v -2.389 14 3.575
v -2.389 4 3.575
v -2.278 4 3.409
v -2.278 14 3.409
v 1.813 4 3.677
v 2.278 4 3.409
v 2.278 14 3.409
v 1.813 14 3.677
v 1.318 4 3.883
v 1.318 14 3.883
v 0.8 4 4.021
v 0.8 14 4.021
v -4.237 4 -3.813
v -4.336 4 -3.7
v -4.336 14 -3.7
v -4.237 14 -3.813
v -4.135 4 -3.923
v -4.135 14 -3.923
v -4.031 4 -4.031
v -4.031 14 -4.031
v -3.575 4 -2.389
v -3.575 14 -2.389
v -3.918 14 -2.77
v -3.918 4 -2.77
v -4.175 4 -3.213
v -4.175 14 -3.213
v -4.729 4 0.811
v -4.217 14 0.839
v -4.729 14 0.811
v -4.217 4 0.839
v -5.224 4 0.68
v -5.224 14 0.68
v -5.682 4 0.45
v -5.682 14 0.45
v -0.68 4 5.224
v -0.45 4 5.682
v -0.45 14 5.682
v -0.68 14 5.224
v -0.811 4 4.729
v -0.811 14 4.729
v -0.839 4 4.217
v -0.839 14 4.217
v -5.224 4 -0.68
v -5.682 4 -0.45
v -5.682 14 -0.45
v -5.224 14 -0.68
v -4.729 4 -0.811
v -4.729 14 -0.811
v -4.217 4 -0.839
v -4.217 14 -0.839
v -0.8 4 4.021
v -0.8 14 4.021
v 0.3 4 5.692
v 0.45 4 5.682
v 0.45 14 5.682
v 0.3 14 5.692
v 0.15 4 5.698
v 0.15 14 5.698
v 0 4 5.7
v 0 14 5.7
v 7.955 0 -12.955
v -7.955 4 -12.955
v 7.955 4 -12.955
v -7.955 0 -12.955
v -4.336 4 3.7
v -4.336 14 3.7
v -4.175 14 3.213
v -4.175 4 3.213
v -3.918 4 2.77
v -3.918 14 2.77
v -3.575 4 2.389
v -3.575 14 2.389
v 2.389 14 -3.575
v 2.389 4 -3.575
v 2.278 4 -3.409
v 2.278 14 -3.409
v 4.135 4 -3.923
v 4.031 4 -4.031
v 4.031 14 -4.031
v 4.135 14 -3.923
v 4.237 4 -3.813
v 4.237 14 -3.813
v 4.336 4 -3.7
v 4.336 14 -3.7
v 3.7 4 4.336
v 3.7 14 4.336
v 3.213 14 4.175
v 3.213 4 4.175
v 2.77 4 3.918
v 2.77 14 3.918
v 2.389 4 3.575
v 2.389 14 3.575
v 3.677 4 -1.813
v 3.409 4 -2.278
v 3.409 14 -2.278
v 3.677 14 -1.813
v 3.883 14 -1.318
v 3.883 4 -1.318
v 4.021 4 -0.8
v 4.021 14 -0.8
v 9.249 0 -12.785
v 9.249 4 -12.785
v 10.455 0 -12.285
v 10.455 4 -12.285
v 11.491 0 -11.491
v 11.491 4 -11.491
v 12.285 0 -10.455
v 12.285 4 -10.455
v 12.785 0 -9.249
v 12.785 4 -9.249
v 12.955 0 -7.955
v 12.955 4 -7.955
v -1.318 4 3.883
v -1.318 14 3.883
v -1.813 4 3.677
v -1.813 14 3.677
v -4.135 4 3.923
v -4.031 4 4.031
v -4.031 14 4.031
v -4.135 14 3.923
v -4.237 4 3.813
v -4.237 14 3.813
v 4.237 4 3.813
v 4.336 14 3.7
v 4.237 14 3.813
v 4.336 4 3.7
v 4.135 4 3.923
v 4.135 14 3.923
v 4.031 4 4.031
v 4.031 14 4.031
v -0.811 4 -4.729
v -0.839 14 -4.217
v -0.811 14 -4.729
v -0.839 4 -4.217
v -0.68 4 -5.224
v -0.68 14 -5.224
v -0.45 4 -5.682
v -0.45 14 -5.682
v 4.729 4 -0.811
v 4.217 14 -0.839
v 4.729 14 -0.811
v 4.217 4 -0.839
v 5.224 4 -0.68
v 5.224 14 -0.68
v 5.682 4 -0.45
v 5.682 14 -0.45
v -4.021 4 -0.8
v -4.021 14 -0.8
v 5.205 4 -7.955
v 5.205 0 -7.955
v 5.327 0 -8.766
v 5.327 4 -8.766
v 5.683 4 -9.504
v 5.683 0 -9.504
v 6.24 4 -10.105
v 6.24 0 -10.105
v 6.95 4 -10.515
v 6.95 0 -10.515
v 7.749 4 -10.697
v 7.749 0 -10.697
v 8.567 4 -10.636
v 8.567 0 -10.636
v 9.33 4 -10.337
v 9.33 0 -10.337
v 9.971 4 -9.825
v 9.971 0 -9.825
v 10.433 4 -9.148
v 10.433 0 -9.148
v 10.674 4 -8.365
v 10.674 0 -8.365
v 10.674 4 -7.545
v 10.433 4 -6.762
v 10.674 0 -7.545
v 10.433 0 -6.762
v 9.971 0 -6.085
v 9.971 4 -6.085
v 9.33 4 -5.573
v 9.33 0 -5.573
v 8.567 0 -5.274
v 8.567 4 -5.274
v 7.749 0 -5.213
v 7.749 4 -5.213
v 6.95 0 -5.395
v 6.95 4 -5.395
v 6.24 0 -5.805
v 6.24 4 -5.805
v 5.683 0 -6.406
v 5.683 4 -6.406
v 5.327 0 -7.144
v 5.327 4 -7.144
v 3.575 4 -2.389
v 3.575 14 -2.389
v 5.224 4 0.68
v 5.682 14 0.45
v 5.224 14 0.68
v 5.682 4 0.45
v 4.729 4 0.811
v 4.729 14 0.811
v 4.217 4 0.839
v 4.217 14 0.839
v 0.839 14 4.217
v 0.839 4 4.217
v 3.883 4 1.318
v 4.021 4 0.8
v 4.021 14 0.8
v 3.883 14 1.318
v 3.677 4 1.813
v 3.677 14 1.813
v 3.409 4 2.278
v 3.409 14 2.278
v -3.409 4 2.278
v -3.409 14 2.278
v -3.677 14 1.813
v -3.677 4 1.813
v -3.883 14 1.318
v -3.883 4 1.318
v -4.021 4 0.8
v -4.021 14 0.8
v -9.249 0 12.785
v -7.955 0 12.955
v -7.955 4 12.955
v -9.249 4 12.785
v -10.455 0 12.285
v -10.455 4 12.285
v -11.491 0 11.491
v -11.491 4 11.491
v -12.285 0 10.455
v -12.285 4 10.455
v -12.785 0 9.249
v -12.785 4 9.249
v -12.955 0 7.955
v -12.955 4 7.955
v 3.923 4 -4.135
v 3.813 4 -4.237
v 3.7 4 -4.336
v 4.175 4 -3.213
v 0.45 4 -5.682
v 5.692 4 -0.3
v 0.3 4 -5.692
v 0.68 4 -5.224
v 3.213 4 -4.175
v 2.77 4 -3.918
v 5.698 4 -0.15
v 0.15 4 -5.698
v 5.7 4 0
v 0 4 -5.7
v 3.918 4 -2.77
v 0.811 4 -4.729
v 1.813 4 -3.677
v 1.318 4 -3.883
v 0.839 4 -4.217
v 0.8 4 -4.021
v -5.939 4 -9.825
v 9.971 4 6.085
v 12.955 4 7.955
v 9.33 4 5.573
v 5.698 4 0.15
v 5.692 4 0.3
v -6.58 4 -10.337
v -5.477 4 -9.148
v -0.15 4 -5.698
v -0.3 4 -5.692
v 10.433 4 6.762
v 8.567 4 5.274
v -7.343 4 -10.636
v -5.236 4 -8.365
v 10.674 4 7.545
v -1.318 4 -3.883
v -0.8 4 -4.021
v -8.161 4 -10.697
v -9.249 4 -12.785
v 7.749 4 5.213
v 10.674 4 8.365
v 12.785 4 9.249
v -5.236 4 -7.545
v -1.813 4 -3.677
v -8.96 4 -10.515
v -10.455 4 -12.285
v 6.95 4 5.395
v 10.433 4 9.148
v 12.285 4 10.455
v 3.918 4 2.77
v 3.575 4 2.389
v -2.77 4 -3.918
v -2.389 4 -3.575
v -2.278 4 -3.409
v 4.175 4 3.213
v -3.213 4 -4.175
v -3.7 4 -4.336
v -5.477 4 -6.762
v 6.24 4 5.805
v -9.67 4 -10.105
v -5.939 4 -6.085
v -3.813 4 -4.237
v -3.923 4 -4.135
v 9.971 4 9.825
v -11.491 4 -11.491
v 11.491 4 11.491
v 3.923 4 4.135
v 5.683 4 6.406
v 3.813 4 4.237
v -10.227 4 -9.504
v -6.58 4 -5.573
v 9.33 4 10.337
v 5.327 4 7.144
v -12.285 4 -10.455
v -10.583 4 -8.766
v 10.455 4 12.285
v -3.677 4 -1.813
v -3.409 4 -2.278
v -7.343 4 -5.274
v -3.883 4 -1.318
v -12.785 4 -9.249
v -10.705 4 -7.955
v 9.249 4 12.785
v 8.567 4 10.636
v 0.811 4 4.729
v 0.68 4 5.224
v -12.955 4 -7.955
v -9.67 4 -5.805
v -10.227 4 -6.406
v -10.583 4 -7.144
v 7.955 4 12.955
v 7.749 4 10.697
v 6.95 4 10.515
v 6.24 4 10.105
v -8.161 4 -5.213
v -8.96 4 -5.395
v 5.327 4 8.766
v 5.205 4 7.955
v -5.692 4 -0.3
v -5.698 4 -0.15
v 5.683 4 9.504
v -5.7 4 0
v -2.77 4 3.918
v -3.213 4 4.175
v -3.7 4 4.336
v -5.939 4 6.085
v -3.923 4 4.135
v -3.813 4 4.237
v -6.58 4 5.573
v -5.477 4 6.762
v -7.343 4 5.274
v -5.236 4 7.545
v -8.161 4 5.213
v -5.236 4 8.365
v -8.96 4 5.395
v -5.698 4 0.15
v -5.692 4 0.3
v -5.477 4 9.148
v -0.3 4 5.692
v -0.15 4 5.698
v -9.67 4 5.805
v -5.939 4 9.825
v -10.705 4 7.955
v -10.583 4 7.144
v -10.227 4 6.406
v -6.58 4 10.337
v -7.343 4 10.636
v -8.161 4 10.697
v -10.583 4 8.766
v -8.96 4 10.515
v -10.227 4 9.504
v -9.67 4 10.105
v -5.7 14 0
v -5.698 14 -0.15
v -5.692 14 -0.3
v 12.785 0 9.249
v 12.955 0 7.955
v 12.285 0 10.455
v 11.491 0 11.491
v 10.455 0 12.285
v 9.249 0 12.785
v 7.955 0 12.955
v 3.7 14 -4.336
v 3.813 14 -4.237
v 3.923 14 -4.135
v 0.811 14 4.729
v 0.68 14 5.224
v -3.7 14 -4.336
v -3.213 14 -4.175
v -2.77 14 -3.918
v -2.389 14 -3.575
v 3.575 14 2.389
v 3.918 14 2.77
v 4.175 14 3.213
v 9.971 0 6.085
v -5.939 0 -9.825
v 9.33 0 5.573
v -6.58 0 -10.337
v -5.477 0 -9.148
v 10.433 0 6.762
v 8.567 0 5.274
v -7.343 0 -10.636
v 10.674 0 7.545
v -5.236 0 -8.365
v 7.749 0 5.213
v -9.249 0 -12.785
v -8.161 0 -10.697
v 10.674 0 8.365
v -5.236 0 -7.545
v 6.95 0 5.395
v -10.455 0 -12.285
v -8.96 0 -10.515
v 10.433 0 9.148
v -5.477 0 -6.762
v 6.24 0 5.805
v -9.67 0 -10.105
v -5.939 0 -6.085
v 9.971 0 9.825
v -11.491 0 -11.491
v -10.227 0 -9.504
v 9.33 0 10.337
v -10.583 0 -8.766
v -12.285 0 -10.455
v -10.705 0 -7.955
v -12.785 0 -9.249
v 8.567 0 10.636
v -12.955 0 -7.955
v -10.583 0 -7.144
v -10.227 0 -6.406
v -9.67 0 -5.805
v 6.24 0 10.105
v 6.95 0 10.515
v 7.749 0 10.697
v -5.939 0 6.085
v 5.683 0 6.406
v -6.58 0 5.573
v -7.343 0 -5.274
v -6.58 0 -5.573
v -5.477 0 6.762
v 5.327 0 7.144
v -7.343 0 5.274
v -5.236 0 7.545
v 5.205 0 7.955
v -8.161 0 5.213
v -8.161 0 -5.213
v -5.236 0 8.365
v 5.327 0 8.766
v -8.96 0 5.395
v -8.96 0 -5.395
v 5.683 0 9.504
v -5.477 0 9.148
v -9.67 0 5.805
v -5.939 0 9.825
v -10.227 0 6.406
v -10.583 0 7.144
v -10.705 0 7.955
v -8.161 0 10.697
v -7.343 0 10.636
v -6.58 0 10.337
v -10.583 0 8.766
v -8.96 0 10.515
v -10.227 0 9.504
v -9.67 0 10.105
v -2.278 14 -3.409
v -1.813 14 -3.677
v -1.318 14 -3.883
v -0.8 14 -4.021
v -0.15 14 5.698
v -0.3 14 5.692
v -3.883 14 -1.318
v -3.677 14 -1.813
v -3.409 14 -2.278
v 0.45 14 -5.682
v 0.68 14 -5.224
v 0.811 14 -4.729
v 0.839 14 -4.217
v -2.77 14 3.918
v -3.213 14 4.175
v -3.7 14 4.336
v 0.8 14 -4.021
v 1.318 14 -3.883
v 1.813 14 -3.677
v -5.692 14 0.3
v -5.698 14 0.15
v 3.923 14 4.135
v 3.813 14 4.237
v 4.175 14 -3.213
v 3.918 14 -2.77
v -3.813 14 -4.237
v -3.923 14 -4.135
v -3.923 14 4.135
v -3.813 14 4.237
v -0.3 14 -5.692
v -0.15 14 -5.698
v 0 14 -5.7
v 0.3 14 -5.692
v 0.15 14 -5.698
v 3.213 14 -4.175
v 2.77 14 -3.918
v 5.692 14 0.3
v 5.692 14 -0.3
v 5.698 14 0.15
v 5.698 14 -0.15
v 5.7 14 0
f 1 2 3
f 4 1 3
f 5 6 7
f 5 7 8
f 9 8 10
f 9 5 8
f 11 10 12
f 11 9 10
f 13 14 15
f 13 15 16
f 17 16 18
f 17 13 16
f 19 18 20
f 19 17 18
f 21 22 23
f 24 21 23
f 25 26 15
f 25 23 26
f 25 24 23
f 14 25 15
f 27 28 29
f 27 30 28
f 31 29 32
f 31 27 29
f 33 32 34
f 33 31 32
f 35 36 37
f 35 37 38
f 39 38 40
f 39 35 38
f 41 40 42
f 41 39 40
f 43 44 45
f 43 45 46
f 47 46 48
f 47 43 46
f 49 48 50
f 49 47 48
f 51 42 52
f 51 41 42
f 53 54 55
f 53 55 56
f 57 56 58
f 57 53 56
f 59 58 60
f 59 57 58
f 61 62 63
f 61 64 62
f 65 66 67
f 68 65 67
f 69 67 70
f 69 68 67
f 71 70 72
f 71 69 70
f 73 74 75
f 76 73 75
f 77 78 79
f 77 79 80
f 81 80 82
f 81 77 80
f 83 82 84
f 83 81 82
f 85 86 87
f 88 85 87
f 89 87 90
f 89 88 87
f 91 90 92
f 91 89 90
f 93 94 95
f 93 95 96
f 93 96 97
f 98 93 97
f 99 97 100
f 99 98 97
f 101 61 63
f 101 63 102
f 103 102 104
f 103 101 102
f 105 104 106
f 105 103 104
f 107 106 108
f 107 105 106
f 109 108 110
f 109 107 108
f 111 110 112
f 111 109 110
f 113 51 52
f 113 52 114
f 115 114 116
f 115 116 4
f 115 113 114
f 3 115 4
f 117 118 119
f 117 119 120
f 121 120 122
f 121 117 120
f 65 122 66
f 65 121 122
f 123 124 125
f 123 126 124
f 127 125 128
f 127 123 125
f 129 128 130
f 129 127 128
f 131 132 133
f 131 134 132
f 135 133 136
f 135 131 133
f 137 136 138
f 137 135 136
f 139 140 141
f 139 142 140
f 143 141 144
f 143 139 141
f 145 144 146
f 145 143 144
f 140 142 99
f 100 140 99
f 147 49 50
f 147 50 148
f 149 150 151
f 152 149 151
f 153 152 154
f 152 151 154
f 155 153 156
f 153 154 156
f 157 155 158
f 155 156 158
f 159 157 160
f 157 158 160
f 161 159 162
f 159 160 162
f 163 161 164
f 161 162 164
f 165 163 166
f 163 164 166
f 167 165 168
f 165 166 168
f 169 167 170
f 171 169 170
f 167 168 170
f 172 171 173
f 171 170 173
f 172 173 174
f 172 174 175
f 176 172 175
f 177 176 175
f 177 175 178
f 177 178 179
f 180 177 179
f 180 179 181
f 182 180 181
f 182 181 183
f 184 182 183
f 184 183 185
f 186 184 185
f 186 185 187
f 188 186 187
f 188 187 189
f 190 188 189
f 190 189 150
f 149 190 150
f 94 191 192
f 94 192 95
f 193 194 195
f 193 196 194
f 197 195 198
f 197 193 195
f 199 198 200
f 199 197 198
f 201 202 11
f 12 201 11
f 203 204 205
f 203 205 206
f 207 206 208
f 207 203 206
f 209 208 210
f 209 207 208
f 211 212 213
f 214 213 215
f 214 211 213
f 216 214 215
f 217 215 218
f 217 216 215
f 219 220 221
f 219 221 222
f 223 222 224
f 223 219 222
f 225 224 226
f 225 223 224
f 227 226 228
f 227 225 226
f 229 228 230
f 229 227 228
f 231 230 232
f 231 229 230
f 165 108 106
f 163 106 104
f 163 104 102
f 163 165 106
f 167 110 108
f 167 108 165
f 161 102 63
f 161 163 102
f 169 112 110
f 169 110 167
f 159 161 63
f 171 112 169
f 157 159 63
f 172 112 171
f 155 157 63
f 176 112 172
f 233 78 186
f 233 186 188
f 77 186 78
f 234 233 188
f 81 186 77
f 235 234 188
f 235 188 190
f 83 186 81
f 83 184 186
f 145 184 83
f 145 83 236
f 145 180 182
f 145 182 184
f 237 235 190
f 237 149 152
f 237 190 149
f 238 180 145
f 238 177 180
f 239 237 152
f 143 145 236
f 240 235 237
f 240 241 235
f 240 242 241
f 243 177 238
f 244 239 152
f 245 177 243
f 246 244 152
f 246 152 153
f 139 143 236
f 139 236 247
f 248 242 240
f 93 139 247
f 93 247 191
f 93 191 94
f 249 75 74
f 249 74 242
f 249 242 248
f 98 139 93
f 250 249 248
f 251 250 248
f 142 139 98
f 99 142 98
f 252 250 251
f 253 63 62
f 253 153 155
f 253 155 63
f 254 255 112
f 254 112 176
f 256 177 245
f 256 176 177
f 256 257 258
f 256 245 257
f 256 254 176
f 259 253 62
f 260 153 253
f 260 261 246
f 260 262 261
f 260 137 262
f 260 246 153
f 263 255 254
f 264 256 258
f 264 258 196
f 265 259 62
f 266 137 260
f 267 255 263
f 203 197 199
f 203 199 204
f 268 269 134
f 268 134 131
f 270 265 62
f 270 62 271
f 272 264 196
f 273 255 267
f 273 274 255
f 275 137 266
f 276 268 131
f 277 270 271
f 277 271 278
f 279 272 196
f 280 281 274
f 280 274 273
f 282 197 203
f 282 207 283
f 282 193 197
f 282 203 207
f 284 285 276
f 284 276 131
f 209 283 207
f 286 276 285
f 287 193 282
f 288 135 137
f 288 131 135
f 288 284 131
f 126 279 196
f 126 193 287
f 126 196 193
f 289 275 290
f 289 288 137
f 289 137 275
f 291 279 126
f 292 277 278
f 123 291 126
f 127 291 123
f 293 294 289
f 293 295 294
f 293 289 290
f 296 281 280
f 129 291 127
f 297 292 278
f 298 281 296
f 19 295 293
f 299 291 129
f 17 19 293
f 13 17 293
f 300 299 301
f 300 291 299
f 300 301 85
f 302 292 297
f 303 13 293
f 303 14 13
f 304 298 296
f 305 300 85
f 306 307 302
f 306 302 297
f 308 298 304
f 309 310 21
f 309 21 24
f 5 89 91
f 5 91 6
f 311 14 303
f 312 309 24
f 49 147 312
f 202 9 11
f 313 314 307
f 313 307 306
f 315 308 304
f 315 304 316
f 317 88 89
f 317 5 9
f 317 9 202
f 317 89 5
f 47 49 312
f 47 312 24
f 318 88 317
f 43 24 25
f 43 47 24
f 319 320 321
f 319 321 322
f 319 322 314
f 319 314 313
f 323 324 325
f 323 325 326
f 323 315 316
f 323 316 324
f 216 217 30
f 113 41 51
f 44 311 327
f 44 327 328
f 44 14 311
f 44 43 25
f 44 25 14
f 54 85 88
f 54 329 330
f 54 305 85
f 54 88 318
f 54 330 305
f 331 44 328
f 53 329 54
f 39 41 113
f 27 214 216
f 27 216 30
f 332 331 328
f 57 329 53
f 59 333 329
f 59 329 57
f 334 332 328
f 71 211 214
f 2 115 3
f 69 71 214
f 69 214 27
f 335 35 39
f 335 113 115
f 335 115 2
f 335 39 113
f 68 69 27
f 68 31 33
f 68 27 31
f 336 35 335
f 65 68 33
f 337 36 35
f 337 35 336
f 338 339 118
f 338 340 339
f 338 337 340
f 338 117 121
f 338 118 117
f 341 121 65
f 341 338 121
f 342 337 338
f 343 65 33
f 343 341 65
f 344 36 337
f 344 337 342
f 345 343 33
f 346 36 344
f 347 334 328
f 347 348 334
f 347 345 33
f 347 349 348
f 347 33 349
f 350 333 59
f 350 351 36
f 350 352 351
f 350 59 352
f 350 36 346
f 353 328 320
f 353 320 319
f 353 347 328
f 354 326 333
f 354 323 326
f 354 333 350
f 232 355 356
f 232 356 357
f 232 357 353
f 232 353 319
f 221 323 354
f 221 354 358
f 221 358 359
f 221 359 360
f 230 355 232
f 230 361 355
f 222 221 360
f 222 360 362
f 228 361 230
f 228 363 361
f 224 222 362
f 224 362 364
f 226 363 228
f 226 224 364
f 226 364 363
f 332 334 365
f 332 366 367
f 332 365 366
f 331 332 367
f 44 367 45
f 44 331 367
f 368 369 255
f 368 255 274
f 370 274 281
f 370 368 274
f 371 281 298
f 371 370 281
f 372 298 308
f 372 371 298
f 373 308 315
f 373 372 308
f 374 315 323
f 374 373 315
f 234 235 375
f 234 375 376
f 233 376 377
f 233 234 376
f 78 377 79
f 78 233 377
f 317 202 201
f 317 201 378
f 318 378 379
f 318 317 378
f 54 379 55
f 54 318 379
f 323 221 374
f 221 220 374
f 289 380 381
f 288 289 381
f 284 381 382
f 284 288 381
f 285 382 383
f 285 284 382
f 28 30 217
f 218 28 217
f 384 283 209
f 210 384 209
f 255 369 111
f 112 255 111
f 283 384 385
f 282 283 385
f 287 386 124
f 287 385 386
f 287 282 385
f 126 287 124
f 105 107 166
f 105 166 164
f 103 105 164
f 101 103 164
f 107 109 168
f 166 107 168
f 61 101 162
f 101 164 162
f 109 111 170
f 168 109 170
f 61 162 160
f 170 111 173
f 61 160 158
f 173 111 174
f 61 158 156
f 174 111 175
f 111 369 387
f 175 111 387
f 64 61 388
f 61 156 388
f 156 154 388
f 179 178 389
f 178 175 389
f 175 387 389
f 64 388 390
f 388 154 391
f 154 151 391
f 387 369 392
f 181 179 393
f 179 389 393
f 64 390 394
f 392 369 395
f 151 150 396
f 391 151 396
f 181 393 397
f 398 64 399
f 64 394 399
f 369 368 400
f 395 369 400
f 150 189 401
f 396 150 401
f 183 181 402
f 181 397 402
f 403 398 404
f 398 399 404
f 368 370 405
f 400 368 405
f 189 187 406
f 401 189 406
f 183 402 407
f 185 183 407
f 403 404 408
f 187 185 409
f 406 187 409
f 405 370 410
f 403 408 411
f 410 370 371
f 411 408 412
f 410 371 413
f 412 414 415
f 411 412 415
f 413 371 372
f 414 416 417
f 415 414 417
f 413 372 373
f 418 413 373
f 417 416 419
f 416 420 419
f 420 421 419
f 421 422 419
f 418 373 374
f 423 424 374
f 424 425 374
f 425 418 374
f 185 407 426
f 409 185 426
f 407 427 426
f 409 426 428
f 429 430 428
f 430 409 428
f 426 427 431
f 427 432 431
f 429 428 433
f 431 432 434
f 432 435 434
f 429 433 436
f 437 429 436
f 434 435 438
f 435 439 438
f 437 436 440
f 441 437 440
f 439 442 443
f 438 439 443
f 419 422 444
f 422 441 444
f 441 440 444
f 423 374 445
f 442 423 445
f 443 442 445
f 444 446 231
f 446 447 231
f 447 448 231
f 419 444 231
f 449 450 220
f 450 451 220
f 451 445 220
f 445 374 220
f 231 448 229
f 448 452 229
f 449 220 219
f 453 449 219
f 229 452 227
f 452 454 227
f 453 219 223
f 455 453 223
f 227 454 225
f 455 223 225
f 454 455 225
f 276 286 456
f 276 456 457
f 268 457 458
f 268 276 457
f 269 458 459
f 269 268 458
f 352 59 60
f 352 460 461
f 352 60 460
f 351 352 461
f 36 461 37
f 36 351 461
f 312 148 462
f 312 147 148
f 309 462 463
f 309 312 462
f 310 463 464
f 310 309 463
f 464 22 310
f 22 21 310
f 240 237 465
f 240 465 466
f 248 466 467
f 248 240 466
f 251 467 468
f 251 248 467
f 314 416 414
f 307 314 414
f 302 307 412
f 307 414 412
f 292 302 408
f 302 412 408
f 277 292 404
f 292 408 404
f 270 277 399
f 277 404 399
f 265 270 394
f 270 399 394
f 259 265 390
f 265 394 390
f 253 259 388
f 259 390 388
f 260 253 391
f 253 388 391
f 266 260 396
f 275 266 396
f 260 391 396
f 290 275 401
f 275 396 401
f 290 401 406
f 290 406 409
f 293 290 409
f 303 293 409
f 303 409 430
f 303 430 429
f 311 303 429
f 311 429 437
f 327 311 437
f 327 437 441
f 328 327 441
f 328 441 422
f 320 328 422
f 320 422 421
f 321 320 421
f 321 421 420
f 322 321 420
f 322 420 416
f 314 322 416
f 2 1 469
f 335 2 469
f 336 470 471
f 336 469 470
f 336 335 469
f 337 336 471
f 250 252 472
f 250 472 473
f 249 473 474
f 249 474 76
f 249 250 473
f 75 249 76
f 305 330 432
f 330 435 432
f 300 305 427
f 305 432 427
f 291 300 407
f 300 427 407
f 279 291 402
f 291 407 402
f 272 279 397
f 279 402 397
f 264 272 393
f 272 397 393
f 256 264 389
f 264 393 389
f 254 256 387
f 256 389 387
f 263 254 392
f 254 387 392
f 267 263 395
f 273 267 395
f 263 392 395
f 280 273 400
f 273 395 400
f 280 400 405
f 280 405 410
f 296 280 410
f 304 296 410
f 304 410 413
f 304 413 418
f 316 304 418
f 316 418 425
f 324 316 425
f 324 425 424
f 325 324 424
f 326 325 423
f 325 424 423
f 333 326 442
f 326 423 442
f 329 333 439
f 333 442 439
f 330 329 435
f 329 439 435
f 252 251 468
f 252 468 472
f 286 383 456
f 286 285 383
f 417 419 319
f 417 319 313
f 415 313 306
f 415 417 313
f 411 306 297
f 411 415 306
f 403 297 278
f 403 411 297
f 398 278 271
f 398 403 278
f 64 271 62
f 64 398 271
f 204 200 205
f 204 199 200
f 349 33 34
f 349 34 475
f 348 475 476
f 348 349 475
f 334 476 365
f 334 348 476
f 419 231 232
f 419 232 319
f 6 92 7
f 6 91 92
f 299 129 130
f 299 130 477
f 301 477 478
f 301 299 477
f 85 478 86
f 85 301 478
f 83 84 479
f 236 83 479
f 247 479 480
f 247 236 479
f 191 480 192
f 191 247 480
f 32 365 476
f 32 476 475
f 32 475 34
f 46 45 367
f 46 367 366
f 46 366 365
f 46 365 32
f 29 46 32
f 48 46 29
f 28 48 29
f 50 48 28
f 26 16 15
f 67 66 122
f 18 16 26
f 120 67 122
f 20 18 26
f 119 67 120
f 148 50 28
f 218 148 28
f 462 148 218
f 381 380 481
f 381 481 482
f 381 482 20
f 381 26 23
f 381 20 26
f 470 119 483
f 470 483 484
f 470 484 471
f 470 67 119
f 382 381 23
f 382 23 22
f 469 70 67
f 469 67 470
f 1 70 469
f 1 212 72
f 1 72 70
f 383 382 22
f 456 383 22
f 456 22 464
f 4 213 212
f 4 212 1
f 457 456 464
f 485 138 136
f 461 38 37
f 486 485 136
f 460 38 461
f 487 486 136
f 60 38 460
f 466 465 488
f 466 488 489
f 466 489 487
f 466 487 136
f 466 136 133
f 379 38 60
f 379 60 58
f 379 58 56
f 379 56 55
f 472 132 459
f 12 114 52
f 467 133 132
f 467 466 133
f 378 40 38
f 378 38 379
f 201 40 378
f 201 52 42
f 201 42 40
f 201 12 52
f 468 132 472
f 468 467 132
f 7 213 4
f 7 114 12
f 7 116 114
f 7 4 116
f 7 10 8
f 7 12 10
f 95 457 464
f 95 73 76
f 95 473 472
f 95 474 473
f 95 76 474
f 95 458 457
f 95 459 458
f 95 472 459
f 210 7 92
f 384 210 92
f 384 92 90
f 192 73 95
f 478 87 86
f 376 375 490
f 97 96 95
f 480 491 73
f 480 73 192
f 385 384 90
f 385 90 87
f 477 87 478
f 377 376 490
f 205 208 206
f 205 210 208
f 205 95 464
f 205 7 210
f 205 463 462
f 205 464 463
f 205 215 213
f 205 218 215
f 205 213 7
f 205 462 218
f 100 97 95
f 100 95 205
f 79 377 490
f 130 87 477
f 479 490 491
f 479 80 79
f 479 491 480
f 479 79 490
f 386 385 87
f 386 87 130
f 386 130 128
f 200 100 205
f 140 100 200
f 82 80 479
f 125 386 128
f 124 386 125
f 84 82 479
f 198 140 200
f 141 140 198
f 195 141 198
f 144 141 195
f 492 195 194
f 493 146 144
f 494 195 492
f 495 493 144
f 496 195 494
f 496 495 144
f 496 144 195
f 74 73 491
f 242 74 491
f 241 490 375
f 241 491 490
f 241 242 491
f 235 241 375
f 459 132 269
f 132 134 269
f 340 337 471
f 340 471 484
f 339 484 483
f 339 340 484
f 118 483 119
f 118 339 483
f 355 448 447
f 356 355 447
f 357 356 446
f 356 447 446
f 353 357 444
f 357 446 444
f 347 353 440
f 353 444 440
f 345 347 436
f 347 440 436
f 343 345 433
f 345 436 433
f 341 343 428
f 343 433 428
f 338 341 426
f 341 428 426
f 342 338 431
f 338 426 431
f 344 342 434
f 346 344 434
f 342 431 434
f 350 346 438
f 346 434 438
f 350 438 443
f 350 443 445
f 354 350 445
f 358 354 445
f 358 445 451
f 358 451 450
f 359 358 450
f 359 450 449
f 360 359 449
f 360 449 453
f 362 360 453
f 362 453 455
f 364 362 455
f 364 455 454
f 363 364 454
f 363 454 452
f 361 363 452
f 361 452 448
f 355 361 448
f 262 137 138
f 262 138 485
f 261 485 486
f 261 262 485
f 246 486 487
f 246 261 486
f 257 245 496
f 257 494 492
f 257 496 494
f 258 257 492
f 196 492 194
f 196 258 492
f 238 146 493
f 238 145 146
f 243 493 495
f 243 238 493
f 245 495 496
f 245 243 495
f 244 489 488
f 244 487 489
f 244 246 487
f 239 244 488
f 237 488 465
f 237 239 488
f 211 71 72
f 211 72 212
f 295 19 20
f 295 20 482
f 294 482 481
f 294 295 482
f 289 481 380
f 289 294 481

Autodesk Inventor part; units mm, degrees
ref_plane "YZ Plane" through (0, 0, 0) normal (1, 0, 0) x (0, 1, 0)
ref_plane "XZ Plane" through (0, 0, 0) normal (0, 1, 0) x (-1, 0, 0)
ref_plane "XY Plane" through (0, 0, 0) normal (0, 0, 1) x (1, 0, 0)
sketch "Sketch1" plane through (0, 0, 0) normal (0, 1, 0) x (-1, 0, 0)
  line L0 (7.955, -7.955) -> (-7.955, -7.955)
  line L1 (-7.955, -7.955) -> (-7.955, 7.955)
  line L2 (-7.955, 7.955) -> (7.955, 7.955)
  line L3 (7.955, 7.955) -> (7.955, -7.955)
  circle A0 centre (7.955, -7.955) radius 5
  circle A1 centre (7.955, -7.955) radius 2.75
  line L4 (0, 0) -> (4.4409, 0)
  line L5 (0, 0) -> (0, 4.5835)
  circle A2 centre (7.955, 7.955) radius 5
  circle A3 centre (7.955, 7.955) radius 2.75
  circle A4 centre (-7.955, -7.955) radius 5
  circle A5 centre (-7.955, -7.955) radius 2.75
  circle A6 centre (-7.955, 7.955) radius 2.75
  circle A7 centre (-7.955, 7.955) radius 5
  line L6 (12.955, 7.955) -> (12.955, -7.955)
  line L7 (7.955, -12.955) -> (-7.955, -12.955)
  line L8 (7.955, 12.955) -> (-7.955, 12.955)
  line L9 (-12.955, 7.955) -> (-12.955, -7.955)
  dimension "d0" = 11.25
  dimension "d1" = 10
  dimension "d2" = 5.5
extrude "Extrusion1" add sketch "Sketch1" along normal blind 4 contours A4 L1 A5 L0 | A4 L1 A7 L2 A2 L3 A0 L0 | L0 A0 L7 A4 | L0 A5 L1 A4 | A0 L3 A1 L0 | L0 A1 L3 A0 | A4 L9 A7 L1 | L3 A2 L6 A0 | A7 L2 A6 L1 | L1 A6 L2 A7 | A2 L2 A3 L3 | L3 A3 L2 A2 | A7 L8 A2 L2
sketch "Sketch2" plane through (0, 4, 0) normal (0, 1, 0) x (1, 0, 0)
  arc A0 (0.45, 5.6822) -> (0, 5.7) centre (0, 0) ccw
  arc A1 (0.7683, 4.9406) -> (0, 5) centre (0, 0) ccw construction
  arc A2 (0.8, 4.0214) -> (0, 4.1002) centre (0, 0) ccw
  line L0 (0.839, 4.2174) -> (0.8, 4.0214)
  arc A3 (0.839, 4.2174) -> (0, 4.3) centre (0, 0) ccw construction
  arc A4 (0.839, 4.2174) -> (0.45, 5.6822) centre (-1.6581, 4.3383) ccw
  line L1 (-0.839, 4.2174) -> (-0.8, 4.0214)
  arc A5 (-0.45, 5.6822) -> (-0.839, 4.2174) centre (1.6581, 4.3383) ccw
  arc A6 (0, 5) -> (0.7683, 4.9406) centre (0, 0) ccw construction
  arc A7 (0, 5.7) -> (0.45, 5.6822) centre (0, 0) ccw
  arc A8 (0, 4.3) -> (0.839, 4.2174) centre (0, 0) ccw construction
  arc A9 (0, 4.1002) -> (0.8, 4.0214) centre (0, 0) ccw
  dimension "d12" = 10
  dimension "d13" = 2.5
  dimension "d14" = 0.7
  dimension "d15" = 0.7
  dimension "d16" = 0.1998
  dimension "d17" = 0.8
  dimension "d18" = 0.45
extrude "Extrusion2" add sketch "Sketch2" along normal blind 10 contours A9 A2
extrude "Extrusion3" add sketch "Sketch2" along normal blind 10 contours A4 L0 A2 A9 L1 A5 A7 A0
pattern_circular "Circular Pattern1" count 8 over 360 about axis through (0, 4, 0) along (0, 1, 0) of "Extrusion2", "Extrusion3"
properties part number "Carrier_V2_CPY" material "Polystyrene"
